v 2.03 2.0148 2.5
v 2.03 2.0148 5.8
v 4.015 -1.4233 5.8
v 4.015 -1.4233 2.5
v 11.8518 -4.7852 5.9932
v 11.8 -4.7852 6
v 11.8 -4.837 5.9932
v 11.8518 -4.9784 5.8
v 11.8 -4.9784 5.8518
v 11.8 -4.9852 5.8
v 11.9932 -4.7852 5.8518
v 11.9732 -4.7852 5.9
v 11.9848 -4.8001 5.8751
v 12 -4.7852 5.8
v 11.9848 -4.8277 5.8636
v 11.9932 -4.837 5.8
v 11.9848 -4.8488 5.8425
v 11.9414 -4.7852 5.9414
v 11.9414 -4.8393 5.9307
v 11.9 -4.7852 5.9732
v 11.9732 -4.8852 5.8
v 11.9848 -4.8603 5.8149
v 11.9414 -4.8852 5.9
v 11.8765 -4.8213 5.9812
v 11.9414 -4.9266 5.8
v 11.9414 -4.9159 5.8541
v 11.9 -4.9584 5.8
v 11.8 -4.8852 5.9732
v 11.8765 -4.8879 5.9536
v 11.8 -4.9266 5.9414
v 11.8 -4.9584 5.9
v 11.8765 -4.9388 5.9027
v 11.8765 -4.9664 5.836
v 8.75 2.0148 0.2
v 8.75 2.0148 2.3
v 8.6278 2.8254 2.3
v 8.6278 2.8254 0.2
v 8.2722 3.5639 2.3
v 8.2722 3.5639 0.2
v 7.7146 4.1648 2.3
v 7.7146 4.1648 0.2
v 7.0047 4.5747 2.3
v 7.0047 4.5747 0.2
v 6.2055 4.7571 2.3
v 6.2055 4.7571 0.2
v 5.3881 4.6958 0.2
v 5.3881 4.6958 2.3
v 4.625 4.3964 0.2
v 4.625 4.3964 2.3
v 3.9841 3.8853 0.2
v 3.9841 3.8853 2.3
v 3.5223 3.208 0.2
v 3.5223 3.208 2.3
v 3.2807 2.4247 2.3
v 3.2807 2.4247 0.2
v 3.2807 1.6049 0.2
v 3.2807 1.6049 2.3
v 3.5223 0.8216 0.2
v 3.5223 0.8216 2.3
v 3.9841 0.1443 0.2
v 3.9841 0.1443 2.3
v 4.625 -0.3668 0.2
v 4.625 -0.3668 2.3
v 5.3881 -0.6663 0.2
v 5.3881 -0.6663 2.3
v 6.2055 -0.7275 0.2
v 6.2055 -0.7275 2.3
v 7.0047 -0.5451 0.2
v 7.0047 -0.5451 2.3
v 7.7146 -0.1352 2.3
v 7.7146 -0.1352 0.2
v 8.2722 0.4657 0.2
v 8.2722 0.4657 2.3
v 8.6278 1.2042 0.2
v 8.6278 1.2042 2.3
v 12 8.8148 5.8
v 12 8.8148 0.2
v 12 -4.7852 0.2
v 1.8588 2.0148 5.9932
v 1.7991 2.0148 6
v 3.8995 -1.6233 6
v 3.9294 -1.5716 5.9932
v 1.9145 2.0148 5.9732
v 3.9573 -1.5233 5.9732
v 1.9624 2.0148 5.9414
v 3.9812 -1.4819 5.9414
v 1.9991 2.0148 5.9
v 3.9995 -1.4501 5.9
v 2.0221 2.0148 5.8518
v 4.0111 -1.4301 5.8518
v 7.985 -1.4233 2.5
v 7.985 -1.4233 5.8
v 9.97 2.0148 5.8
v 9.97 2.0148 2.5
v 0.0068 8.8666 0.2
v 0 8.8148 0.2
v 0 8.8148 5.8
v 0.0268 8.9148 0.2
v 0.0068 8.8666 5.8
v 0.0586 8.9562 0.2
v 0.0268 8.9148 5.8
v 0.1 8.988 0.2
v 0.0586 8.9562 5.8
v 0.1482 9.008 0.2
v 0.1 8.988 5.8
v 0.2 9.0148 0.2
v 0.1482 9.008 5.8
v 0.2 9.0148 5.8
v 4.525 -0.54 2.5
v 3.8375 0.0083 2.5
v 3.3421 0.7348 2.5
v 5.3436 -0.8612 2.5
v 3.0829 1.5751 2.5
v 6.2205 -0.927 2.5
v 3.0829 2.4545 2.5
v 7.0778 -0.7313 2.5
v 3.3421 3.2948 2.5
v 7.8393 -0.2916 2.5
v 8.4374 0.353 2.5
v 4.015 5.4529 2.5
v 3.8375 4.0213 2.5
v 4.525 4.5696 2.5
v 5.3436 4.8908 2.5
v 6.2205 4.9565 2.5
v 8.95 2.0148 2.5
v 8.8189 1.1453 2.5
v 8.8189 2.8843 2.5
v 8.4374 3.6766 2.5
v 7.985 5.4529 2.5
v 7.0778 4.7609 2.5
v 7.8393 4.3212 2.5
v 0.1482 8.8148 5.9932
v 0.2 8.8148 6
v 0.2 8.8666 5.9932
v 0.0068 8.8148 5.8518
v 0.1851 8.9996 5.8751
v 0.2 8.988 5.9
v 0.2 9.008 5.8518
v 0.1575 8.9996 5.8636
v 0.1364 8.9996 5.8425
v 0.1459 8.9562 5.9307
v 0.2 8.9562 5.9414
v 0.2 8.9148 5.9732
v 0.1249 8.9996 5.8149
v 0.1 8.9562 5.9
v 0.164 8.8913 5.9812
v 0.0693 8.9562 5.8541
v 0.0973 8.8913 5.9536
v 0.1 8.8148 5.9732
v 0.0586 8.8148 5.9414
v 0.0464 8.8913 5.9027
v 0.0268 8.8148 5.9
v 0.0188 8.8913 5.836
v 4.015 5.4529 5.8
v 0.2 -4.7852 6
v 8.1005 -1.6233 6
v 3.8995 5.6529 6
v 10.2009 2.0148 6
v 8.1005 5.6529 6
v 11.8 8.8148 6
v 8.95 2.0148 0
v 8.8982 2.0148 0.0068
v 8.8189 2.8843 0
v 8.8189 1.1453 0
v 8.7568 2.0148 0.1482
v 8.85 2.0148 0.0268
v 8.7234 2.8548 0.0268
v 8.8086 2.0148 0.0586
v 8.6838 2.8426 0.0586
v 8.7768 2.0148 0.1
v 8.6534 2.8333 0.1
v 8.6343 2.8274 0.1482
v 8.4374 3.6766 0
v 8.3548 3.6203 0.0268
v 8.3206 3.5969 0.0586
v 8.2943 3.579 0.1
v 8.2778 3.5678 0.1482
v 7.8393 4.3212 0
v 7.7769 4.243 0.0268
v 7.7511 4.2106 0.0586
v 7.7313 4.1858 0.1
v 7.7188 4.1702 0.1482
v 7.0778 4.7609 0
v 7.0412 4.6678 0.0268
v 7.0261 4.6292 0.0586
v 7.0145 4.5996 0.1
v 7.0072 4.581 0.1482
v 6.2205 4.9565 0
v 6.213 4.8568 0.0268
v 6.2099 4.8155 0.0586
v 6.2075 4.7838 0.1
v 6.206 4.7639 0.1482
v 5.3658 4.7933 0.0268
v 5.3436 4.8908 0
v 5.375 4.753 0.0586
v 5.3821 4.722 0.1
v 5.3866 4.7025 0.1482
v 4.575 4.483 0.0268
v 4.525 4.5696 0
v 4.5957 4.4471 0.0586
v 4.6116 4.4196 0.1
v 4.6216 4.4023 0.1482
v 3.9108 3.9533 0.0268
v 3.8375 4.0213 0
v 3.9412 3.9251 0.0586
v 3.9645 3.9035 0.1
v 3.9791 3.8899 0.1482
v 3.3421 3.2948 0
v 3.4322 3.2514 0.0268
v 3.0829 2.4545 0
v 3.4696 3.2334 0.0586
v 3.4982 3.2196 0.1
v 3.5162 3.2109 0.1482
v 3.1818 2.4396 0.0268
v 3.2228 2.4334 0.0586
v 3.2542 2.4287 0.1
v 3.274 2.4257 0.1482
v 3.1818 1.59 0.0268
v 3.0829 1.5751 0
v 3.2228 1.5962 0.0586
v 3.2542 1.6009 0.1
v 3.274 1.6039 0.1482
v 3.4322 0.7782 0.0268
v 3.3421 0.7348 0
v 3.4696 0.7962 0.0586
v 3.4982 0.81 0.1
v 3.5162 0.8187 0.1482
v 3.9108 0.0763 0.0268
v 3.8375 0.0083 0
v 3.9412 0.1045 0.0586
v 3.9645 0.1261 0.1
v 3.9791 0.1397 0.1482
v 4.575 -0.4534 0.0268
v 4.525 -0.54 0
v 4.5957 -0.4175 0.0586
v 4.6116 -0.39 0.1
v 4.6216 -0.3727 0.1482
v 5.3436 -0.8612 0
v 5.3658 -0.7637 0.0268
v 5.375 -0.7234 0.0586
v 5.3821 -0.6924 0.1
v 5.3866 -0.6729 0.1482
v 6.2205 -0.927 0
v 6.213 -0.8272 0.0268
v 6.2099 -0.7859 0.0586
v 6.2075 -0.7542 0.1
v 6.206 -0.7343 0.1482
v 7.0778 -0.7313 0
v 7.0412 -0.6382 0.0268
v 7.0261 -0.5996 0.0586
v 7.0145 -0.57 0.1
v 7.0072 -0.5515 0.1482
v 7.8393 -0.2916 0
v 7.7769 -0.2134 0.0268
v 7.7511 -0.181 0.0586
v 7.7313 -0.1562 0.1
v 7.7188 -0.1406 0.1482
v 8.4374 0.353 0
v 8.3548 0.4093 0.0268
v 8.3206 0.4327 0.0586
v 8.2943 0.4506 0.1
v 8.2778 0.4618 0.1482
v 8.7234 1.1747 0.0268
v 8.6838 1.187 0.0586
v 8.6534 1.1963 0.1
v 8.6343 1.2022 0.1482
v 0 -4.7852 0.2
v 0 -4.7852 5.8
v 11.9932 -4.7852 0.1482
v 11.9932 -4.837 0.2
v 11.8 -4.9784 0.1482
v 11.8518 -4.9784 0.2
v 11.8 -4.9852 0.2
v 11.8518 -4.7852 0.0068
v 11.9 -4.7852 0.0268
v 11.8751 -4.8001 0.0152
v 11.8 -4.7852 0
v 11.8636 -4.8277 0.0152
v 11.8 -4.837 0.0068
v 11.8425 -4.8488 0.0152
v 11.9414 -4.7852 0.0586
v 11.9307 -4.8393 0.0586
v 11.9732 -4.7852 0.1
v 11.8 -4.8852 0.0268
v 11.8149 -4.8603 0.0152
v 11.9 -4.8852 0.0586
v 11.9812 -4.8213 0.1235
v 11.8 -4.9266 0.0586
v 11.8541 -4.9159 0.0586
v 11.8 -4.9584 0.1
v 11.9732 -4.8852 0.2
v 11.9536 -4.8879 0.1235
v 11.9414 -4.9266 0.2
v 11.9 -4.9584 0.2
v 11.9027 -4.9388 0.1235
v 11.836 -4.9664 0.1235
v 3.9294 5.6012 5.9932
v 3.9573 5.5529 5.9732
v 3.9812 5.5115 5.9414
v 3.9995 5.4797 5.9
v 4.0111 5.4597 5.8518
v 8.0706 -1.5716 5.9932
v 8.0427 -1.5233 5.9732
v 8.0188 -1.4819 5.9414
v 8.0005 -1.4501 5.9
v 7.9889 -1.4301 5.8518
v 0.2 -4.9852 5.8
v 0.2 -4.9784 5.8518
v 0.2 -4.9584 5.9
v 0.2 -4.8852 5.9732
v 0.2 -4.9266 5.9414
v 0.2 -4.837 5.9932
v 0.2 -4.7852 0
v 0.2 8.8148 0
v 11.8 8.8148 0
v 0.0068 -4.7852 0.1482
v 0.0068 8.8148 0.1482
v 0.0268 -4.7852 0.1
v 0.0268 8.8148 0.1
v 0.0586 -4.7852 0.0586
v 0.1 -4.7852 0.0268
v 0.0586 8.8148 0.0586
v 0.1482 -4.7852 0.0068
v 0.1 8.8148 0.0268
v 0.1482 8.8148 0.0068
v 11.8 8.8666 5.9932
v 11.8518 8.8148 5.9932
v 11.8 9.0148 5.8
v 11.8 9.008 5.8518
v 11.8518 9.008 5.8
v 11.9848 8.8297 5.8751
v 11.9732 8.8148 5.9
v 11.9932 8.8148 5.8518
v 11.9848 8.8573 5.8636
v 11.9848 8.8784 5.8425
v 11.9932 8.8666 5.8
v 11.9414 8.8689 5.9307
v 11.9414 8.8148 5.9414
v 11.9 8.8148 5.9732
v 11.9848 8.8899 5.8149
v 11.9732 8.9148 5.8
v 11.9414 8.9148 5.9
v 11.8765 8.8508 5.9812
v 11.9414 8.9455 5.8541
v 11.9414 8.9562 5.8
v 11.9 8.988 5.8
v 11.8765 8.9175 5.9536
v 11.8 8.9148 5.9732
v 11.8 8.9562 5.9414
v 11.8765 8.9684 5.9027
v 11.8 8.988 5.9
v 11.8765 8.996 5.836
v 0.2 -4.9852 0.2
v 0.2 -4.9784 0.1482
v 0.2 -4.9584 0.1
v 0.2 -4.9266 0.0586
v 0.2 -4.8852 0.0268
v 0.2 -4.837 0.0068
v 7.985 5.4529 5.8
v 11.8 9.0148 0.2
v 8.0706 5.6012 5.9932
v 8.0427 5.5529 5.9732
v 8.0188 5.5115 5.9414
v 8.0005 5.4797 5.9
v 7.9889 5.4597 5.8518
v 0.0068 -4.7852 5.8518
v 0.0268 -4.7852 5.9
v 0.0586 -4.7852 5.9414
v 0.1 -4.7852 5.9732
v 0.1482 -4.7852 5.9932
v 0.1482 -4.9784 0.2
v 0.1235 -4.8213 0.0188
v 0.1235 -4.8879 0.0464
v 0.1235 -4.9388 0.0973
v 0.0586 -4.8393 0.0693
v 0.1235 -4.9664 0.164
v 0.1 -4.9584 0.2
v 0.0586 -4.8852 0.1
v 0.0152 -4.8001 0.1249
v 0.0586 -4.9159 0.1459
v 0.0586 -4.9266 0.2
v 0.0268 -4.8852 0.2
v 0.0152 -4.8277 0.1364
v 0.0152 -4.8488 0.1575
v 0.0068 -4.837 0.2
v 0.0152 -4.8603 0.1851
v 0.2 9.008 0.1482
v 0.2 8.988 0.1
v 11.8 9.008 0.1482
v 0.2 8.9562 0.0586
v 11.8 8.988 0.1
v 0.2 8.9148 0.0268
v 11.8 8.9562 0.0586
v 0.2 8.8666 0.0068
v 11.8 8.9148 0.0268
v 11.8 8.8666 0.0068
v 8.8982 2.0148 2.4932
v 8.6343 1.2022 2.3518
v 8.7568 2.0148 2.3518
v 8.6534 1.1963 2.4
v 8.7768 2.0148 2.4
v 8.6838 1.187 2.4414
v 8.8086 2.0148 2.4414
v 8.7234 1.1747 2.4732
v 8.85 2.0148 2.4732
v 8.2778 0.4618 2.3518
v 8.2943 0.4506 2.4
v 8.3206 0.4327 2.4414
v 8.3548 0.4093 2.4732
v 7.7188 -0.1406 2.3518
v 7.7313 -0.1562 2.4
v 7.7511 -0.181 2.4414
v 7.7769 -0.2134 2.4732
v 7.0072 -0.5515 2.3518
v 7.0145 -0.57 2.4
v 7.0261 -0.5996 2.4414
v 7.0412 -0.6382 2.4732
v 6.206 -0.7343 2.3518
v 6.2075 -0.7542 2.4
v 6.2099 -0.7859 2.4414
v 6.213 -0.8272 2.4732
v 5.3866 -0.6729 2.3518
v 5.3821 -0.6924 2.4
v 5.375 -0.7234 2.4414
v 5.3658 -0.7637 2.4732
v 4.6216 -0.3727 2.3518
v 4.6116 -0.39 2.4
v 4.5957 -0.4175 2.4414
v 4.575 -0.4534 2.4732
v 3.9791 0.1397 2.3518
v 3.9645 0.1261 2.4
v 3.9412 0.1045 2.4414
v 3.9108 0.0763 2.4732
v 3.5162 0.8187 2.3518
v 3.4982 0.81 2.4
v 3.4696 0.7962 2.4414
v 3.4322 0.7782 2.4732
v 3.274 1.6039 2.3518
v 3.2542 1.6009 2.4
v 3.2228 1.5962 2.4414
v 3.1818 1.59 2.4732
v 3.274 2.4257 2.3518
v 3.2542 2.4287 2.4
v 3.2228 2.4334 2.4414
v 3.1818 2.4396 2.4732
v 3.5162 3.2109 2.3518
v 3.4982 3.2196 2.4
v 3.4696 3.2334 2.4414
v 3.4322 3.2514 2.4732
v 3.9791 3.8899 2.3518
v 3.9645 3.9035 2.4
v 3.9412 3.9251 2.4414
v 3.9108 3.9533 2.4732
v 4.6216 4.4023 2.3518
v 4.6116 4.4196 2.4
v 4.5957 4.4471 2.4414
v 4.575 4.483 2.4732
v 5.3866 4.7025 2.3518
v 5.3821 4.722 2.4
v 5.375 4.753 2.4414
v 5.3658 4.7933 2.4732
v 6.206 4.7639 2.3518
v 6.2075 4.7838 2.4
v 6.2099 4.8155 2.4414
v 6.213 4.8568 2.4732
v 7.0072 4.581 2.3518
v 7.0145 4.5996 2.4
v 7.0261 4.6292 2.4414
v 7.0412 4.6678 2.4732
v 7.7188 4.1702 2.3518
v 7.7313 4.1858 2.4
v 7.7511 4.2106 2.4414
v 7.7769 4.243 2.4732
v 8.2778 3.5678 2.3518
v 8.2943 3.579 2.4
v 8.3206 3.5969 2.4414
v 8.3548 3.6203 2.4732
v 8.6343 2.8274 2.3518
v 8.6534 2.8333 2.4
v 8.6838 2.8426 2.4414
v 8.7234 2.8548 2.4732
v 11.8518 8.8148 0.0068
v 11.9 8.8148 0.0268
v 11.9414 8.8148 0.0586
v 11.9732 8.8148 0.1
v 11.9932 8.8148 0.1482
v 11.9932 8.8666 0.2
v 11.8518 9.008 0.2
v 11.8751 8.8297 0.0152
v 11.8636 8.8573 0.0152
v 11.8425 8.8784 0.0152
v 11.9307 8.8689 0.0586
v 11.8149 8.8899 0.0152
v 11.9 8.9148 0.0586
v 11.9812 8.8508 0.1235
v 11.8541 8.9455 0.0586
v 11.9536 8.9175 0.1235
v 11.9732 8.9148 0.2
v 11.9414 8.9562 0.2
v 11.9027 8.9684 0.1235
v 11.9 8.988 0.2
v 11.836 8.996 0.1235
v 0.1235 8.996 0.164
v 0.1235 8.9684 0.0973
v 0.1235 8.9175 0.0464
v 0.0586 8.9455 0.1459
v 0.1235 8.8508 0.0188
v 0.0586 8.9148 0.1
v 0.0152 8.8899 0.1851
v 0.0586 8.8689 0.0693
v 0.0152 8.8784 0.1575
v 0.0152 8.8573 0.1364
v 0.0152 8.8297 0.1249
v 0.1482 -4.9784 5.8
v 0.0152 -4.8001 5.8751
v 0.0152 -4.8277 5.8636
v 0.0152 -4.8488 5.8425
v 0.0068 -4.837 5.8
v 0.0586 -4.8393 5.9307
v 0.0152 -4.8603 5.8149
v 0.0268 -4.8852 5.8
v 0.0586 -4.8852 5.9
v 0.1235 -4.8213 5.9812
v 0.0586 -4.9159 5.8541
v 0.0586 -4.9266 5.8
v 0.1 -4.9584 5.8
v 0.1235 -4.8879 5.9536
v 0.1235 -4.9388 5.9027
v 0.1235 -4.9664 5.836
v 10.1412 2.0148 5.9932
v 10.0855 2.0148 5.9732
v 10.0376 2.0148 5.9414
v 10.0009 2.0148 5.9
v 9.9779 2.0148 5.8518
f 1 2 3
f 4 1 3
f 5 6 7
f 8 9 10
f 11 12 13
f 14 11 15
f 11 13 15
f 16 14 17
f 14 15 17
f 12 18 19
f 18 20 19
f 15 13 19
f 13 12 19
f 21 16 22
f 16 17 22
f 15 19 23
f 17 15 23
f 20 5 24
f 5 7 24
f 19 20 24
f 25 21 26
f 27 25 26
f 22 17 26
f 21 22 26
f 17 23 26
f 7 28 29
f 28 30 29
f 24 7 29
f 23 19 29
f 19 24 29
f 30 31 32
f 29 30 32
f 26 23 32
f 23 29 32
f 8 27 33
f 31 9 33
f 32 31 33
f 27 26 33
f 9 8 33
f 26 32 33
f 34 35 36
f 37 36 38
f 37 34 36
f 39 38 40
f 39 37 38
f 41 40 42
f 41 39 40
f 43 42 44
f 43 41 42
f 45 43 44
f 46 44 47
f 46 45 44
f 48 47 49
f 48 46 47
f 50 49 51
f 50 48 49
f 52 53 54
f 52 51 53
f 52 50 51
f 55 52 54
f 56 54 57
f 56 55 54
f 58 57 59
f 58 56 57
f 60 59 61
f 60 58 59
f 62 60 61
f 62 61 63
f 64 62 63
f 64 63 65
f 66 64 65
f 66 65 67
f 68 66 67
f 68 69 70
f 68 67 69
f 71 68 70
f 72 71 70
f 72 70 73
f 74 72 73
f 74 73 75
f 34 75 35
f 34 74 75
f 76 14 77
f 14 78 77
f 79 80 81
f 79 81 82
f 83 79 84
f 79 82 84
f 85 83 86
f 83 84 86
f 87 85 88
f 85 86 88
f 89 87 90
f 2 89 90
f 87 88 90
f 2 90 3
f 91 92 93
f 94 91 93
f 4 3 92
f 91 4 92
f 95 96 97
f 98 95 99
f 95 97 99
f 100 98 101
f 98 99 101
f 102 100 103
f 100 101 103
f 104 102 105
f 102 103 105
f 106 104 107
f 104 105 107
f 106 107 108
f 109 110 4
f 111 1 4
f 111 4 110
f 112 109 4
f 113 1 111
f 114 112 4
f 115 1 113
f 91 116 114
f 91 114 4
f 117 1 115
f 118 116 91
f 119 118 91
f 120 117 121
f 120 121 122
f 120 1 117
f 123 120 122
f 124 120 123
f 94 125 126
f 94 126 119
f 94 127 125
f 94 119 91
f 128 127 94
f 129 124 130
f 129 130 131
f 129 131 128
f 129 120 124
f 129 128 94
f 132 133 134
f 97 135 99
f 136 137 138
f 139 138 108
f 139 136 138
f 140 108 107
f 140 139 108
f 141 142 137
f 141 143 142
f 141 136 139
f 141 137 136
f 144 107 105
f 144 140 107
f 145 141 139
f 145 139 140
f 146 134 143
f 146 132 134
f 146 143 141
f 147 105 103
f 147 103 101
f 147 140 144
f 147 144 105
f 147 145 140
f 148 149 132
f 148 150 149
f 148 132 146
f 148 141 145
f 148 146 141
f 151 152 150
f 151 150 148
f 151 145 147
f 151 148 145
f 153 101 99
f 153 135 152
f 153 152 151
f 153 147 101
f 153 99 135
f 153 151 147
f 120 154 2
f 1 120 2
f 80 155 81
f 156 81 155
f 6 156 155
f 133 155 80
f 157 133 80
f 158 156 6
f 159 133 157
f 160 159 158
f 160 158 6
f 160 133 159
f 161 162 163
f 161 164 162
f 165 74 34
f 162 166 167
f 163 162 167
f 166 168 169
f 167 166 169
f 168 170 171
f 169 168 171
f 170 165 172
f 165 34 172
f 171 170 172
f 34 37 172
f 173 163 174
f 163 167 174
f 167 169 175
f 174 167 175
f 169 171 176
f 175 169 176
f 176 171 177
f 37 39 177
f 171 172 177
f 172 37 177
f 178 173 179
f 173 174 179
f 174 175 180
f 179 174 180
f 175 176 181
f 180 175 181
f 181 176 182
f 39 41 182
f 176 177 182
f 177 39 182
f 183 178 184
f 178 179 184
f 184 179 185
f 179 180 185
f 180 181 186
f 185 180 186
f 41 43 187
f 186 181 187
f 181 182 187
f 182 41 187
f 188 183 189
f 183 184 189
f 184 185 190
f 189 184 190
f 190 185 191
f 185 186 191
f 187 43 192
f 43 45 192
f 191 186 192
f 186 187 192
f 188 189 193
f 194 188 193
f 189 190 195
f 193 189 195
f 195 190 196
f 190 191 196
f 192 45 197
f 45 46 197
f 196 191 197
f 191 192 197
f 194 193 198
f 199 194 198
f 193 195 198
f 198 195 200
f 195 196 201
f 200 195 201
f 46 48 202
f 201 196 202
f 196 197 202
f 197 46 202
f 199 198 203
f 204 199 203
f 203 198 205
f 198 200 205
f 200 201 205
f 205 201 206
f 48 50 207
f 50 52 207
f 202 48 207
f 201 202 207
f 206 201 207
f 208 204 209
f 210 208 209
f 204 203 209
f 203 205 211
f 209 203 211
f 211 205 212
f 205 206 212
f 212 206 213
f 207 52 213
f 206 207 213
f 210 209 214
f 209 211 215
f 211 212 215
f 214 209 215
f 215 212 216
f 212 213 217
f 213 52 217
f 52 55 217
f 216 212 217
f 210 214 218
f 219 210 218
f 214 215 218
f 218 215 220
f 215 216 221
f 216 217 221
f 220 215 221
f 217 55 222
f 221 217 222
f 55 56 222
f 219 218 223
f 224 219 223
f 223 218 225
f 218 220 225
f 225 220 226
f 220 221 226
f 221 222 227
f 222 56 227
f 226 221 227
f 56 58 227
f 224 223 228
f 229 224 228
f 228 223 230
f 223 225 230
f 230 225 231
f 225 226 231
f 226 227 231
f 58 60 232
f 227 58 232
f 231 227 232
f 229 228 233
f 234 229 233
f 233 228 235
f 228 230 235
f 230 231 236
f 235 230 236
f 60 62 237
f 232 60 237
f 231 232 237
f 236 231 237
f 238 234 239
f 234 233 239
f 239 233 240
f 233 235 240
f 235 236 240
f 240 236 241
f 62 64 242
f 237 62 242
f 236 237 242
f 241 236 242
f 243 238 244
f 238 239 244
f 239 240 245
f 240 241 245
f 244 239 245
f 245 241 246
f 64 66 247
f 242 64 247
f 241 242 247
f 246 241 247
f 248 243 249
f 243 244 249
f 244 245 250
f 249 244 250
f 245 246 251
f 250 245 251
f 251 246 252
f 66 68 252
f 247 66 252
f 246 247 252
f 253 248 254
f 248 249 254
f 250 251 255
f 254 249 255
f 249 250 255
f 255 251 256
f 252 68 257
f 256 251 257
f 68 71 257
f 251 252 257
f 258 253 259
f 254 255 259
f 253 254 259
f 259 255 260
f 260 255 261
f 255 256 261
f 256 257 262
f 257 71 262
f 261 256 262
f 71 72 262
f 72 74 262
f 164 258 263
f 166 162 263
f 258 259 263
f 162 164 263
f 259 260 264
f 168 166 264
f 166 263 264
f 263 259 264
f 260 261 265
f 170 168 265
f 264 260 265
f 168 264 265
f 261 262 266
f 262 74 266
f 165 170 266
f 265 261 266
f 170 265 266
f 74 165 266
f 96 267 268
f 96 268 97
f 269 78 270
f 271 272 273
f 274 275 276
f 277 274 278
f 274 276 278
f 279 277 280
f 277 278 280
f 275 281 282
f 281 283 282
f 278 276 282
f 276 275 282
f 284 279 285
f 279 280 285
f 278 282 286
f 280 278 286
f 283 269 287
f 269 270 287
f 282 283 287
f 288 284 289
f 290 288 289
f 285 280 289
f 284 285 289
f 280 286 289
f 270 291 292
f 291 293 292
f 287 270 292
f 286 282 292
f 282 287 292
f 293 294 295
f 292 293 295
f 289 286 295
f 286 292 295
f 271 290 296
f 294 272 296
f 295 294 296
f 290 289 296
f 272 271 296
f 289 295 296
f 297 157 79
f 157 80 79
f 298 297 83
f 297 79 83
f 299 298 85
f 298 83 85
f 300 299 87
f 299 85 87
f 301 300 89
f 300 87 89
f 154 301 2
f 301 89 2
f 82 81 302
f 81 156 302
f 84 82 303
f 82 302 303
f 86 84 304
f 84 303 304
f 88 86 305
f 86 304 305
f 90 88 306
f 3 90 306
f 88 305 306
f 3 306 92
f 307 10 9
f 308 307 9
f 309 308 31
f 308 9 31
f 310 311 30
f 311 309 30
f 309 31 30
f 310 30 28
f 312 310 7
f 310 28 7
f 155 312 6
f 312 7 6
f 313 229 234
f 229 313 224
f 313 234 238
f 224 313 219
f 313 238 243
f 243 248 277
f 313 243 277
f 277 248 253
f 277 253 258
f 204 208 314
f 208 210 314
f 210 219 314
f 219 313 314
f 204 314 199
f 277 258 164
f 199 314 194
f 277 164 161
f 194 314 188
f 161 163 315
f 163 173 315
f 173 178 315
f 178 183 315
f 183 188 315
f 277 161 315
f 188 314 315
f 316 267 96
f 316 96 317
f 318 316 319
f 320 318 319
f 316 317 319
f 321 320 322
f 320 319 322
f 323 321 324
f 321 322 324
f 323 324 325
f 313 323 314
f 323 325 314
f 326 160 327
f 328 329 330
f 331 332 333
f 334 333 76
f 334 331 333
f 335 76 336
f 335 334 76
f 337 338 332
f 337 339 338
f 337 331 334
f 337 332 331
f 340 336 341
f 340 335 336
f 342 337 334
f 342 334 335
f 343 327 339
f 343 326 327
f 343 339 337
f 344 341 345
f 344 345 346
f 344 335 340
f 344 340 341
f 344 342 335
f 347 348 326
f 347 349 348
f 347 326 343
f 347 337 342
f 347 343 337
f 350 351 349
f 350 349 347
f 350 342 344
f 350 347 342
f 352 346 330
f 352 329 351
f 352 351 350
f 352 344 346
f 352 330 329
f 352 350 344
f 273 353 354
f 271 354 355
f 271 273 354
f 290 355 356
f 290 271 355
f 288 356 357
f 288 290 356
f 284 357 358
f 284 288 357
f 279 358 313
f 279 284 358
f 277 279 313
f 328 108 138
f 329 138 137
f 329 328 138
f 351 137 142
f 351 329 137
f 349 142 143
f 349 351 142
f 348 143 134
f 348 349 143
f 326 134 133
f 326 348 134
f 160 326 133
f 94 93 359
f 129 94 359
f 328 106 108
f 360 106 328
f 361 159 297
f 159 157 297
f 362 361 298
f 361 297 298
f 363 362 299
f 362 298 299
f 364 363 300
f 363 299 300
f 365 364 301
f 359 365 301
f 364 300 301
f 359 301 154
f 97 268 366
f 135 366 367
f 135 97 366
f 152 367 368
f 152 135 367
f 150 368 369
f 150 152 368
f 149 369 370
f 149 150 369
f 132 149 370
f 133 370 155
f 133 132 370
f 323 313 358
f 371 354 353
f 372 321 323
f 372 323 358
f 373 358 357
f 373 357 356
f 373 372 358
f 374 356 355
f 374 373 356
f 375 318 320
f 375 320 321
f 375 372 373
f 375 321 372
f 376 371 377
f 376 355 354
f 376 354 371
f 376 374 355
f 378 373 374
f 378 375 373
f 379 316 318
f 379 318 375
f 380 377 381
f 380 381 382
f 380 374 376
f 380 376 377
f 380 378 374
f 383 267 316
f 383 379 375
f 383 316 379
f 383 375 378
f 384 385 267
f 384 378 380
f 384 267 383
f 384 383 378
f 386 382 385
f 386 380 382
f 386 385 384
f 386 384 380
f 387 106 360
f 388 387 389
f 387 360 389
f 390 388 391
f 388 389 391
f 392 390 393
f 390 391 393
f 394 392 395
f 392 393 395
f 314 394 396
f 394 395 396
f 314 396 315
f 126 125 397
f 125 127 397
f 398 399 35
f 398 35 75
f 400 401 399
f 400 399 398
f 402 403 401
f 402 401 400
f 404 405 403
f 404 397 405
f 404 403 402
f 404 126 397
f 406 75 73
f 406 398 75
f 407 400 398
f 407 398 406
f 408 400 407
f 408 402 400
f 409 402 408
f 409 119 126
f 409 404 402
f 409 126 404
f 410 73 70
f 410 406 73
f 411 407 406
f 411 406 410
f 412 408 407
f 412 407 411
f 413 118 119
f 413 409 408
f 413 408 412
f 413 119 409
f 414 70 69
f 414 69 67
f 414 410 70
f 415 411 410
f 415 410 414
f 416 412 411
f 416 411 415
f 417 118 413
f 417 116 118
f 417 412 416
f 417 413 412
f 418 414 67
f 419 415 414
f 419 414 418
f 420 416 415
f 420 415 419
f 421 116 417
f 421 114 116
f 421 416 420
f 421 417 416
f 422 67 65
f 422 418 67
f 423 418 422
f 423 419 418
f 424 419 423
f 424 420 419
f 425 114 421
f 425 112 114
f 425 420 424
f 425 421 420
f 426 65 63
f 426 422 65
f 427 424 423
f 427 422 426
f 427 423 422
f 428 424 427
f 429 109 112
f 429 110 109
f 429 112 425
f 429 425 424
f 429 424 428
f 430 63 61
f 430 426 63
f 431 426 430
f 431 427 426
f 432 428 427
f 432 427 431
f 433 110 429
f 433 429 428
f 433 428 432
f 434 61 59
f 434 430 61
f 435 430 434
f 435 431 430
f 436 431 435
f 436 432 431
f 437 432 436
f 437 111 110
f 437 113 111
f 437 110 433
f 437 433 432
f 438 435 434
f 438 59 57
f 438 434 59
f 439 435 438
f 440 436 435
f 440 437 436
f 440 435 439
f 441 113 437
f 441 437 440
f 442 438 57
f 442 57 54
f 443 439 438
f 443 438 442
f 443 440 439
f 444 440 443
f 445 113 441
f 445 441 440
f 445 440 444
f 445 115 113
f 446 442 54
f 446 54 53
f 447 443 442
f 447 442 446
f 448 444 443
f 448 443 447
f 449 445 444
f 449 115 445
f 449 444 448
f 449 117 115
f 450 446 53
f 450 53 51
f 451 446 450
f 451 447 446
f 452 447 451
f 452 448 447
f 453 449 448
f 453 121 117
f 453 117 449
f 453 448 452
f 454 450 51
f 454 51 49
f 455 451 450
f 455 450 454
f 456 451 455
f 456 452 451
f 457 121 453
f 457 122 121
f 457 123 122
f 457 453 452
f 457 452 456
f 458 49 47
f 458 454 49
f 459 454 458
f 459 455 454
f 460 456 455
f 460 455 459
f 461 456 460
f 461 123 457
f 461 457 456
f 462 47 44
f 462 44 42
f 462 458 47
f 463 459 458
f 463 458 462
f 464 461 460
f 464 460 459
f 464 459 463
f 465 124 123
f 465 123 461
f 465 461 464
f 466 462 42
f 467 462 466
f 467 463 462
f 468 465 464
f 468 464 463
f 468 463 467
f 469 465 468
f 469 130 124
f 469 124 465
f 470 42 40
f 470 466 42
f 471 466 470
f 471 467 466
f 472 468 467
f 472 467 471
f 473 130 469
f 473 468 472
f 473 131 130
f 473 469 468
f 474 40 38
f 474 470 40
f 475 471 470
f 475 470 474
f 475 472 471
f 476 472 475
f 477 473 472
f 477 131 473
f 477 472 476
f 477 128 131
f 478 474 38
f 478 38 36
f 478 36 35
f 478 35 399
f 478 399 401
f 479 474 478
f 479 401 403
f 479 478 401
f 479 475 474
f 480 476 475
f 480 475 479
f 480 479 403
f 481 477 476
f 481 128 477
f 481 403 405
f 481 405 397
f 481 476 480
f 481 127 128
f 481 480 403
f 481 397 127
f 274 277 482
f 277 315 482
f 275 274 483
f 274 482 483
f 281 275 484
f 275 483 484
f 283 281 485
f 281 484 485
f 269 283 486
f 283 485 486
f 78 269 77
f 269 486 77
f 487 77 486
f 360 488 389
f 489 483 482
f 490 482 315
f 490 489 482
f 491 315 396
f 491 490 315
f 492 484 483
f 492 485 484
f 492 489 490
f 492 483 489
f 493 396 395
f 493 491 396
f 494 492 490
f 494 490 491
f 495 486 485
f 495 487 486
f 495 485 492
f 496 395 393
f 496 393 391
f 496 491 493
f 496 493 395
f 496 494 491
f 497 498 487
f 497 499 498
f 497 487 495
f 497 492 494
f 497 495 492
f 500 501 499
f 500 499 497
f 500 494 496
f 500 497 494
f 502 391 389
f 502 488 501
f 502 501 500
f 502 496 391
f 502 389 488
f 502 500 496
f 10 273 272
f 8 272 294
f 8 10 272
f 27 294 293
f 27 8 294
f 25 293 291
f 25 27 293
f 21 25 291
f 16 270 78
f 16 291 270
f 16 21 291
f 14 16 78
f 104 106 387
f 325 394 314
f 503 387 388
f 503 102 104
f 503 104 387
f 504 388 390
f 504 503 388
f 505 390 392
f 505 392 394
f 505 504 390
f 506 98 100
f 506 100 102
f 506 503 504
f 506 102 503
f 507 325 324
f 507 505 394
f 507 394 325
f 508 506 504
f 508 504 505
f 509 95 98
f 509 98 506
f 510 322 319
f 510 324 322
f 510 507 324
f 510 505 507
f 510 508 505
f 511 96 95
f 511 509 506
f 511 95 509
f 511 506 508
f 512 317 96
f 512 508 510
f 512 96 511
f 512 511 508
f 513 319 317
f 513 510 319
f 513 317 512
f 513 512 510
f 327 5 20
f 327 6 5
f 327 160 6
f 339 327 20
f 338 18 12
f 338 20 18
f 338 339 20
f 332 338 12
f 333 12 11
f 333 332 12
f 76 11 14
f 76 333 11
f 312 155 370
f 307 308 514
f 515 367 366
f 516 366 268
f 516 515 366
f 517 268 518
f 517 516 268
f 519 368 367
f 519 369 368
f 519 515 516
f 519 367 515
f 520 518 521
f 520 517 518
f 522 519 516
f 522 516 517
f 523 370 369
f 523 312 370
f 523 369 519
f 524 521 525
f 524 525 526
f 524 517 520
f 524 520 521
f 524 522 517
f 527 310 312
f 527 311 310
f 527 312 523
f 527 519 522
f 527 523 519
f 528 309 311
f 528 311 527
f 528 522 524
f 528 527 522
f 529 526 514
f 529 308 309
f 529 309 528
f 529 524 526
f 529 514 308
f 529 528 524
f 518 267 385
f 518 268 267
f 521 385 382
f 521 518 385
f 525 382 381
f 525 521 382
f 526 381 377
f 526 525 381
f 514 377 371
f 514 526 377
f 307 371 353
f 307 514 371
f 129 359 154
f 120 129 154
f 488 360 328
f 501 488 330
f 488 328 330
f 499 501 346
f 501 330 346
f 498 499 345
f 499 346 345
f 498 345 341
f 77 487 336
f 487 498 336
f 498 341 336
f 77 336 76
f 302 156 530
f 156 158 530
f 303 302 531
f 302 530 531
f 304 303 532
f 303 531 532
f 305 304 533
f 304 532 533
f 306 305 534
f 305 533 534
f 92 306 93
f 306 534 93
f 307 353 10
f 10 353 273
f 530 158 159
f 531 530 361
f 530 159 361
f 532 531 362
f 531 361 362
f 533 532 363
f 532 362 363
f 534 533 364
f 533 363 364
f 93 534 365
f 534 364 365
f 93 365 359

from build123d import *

# Parameters (mm, degrees)
F4_W         = 12
F4_H         = 14
F4_R         = 2.75
F0_DEPTH     = 6
F5_DEPTH     = 3.5
F2_R         = 0.2
F3_T1_DEPTH  = 13.6
F3_S5_W      = 0.2
F3_S5_H      = 0.2
F3_T6_DEPTH  = 0.2
F3_S11_W     = 0.2
F3_S11_H     = 0.2
F3_T12_DEPTH = 0.2


# Not quite as in the source:
# - a fillet or chamfer that OpenCascade refuses, or shapes differently, is made with other operations: its cross-section is extruded or revolved along the edge and cut away or added


with BuildPart() as f0:
    # F4 (on Top) → F0 (new body)
    with BuildSketch(Plane.XY):
        with Locations((6, 2.0147956188)):
            Rectangle(F4_W, F4_H)
        with Locations((6, 2.0147956188)):
            Circle(F4_R, mode=Mode.SUBTRACT)
    extrude(amount=F0_DEPTH)

    # F1 (on face) → F5 (cut)
    with BuildSketch(Plane.XY.offset(6)):
        Polygon((4.015, -1.4233252342), (7.985, -1.4233252342), (9.97, 2.0147956188), (7.985, 5.4529164718), (4.015, 5.4529164718), (2.03, 2.0147956188), align=None)
    extrude(amount=-F5_DEPTH, mode=Mode.SUBTRACT)

    # F2
    f2_edges = [f0.edges().sort_by_distance(p)[0] for p in [
        (6, -4.985204, 6),
        (0, 2.014796, 6),
        (6, 9.014796, 6),
        (12, 2.014796, 6),
        (6, 5.452916, 6),
        (8.9775, 3.733856, 6),
        (8.9775, 0.295735, 6),
        (6, -1.423325, 6),
        (3.0225, 0.295735, 6),
        (3.0225, 3.733856, 6),
        (3.25, 2.014796, 2.5),
        (12, -4.985204, 3),
        (12, 9.014796, 3),
        (12, 2.014796, 0),
        (6, -4.985204, 0),
        (0, -4.985204, 3),
        (3.25, 2.014796, 0),
        (6, 9.014796, 0),
        (0, 9.014796, 3),
    ]]
    fillet(f2_edges, radius=F2_R)

    # F3: fillet of radius 0.2 on 1 edges, made by hand

    # F3_s2 → F3_t1 (cut)
    with BuildSketch(Plane.XZ.offset(-8.8147956188)):
        with BuildLine():
            ThreePointArc((0, 0.2), (0.0585786438, 0.0585786438), (0.2, 0))
            Line((0.2, 0), (0, 0))
            Line((0, 0), (0, 0.2))
        make_face()
    extrude(amount=F3_T1_DEPTH, mode=Mode.SUBTRACT)


with BuildPart() as f3_tool4:
    # F3_s5 → F3_t6 (new body)
    with BuildSketch(Plane.YZ.offset(0.2)):
        with Locations((8.9147956188, 0.1)):
            Rectangle(F3_S5_W, F3_S5_H)
    extrude(amount=-F3_T6_DEPTH)

    # F3_s7 → F3_t8 (revolve, cut)
    with BuildSketch(Plane(origin=(0.2, 8.8147956188, 0.2), x_dir=(0, -0.7071067812, 0.7071067812), z_dir=(0, -0.7071067812, -0.7071067812))):
        with BuildLine():
            ThreePointArc((0, -0.2), (0.2, 0), (0, 0.2))
            Line((0, 0.2), (0, -0.2))
        make_face()
    revolve(axis=Axis((0.2, 8.8147956188, 0.2), (-1, 0, 0)), mode=Mode.SUBTRACT)


with BuildPart() as f0_1:
    add(f0.part)

    # F3_t3: cut F3_tool4
    add(f3_tool4.part, mode=Mode.SUBTRACT)


with BuildPart() as f3_tool10:
    # F3_s11 → F3_t12 (new body)
    with BuildSketch(Plane.YZ.offset(0.2)):
        with Locations((-4.8852043812, 0.1)):
            Rectangle(F3_S11_W, F3_S11_H)
    extrude(amount=-F3_T12_DEPTH)

    # F3_s13 → F3_t14 (revolve, cut)
    with BuildSketch(Plane(origin=(0.2, -4.7852043812, 0.2), x_dir=(0, 0.7071067812, 0.7071067812), z_dir=(0, -0.7071067812, 0.7071067812))):
        with BuildLine():
            ThreePointArc((0, -0.2), (0.2, 0), (0, 0.2))
            Line((0, 0.2), (0, -0.2))
        make_face()
    revolve(axis=Axis((0.2, -4.7852043812, 0.2), (-1, 0, 0)), mode=Mode.SUBTRACT)


with BuildPart() as f0_2:
    add(f0_1.part)

    # F3_t9: cut F3_tool10
    add(f3_tool10.part, mode=Mode.SUBTRACT)


solid = f0_2.part
